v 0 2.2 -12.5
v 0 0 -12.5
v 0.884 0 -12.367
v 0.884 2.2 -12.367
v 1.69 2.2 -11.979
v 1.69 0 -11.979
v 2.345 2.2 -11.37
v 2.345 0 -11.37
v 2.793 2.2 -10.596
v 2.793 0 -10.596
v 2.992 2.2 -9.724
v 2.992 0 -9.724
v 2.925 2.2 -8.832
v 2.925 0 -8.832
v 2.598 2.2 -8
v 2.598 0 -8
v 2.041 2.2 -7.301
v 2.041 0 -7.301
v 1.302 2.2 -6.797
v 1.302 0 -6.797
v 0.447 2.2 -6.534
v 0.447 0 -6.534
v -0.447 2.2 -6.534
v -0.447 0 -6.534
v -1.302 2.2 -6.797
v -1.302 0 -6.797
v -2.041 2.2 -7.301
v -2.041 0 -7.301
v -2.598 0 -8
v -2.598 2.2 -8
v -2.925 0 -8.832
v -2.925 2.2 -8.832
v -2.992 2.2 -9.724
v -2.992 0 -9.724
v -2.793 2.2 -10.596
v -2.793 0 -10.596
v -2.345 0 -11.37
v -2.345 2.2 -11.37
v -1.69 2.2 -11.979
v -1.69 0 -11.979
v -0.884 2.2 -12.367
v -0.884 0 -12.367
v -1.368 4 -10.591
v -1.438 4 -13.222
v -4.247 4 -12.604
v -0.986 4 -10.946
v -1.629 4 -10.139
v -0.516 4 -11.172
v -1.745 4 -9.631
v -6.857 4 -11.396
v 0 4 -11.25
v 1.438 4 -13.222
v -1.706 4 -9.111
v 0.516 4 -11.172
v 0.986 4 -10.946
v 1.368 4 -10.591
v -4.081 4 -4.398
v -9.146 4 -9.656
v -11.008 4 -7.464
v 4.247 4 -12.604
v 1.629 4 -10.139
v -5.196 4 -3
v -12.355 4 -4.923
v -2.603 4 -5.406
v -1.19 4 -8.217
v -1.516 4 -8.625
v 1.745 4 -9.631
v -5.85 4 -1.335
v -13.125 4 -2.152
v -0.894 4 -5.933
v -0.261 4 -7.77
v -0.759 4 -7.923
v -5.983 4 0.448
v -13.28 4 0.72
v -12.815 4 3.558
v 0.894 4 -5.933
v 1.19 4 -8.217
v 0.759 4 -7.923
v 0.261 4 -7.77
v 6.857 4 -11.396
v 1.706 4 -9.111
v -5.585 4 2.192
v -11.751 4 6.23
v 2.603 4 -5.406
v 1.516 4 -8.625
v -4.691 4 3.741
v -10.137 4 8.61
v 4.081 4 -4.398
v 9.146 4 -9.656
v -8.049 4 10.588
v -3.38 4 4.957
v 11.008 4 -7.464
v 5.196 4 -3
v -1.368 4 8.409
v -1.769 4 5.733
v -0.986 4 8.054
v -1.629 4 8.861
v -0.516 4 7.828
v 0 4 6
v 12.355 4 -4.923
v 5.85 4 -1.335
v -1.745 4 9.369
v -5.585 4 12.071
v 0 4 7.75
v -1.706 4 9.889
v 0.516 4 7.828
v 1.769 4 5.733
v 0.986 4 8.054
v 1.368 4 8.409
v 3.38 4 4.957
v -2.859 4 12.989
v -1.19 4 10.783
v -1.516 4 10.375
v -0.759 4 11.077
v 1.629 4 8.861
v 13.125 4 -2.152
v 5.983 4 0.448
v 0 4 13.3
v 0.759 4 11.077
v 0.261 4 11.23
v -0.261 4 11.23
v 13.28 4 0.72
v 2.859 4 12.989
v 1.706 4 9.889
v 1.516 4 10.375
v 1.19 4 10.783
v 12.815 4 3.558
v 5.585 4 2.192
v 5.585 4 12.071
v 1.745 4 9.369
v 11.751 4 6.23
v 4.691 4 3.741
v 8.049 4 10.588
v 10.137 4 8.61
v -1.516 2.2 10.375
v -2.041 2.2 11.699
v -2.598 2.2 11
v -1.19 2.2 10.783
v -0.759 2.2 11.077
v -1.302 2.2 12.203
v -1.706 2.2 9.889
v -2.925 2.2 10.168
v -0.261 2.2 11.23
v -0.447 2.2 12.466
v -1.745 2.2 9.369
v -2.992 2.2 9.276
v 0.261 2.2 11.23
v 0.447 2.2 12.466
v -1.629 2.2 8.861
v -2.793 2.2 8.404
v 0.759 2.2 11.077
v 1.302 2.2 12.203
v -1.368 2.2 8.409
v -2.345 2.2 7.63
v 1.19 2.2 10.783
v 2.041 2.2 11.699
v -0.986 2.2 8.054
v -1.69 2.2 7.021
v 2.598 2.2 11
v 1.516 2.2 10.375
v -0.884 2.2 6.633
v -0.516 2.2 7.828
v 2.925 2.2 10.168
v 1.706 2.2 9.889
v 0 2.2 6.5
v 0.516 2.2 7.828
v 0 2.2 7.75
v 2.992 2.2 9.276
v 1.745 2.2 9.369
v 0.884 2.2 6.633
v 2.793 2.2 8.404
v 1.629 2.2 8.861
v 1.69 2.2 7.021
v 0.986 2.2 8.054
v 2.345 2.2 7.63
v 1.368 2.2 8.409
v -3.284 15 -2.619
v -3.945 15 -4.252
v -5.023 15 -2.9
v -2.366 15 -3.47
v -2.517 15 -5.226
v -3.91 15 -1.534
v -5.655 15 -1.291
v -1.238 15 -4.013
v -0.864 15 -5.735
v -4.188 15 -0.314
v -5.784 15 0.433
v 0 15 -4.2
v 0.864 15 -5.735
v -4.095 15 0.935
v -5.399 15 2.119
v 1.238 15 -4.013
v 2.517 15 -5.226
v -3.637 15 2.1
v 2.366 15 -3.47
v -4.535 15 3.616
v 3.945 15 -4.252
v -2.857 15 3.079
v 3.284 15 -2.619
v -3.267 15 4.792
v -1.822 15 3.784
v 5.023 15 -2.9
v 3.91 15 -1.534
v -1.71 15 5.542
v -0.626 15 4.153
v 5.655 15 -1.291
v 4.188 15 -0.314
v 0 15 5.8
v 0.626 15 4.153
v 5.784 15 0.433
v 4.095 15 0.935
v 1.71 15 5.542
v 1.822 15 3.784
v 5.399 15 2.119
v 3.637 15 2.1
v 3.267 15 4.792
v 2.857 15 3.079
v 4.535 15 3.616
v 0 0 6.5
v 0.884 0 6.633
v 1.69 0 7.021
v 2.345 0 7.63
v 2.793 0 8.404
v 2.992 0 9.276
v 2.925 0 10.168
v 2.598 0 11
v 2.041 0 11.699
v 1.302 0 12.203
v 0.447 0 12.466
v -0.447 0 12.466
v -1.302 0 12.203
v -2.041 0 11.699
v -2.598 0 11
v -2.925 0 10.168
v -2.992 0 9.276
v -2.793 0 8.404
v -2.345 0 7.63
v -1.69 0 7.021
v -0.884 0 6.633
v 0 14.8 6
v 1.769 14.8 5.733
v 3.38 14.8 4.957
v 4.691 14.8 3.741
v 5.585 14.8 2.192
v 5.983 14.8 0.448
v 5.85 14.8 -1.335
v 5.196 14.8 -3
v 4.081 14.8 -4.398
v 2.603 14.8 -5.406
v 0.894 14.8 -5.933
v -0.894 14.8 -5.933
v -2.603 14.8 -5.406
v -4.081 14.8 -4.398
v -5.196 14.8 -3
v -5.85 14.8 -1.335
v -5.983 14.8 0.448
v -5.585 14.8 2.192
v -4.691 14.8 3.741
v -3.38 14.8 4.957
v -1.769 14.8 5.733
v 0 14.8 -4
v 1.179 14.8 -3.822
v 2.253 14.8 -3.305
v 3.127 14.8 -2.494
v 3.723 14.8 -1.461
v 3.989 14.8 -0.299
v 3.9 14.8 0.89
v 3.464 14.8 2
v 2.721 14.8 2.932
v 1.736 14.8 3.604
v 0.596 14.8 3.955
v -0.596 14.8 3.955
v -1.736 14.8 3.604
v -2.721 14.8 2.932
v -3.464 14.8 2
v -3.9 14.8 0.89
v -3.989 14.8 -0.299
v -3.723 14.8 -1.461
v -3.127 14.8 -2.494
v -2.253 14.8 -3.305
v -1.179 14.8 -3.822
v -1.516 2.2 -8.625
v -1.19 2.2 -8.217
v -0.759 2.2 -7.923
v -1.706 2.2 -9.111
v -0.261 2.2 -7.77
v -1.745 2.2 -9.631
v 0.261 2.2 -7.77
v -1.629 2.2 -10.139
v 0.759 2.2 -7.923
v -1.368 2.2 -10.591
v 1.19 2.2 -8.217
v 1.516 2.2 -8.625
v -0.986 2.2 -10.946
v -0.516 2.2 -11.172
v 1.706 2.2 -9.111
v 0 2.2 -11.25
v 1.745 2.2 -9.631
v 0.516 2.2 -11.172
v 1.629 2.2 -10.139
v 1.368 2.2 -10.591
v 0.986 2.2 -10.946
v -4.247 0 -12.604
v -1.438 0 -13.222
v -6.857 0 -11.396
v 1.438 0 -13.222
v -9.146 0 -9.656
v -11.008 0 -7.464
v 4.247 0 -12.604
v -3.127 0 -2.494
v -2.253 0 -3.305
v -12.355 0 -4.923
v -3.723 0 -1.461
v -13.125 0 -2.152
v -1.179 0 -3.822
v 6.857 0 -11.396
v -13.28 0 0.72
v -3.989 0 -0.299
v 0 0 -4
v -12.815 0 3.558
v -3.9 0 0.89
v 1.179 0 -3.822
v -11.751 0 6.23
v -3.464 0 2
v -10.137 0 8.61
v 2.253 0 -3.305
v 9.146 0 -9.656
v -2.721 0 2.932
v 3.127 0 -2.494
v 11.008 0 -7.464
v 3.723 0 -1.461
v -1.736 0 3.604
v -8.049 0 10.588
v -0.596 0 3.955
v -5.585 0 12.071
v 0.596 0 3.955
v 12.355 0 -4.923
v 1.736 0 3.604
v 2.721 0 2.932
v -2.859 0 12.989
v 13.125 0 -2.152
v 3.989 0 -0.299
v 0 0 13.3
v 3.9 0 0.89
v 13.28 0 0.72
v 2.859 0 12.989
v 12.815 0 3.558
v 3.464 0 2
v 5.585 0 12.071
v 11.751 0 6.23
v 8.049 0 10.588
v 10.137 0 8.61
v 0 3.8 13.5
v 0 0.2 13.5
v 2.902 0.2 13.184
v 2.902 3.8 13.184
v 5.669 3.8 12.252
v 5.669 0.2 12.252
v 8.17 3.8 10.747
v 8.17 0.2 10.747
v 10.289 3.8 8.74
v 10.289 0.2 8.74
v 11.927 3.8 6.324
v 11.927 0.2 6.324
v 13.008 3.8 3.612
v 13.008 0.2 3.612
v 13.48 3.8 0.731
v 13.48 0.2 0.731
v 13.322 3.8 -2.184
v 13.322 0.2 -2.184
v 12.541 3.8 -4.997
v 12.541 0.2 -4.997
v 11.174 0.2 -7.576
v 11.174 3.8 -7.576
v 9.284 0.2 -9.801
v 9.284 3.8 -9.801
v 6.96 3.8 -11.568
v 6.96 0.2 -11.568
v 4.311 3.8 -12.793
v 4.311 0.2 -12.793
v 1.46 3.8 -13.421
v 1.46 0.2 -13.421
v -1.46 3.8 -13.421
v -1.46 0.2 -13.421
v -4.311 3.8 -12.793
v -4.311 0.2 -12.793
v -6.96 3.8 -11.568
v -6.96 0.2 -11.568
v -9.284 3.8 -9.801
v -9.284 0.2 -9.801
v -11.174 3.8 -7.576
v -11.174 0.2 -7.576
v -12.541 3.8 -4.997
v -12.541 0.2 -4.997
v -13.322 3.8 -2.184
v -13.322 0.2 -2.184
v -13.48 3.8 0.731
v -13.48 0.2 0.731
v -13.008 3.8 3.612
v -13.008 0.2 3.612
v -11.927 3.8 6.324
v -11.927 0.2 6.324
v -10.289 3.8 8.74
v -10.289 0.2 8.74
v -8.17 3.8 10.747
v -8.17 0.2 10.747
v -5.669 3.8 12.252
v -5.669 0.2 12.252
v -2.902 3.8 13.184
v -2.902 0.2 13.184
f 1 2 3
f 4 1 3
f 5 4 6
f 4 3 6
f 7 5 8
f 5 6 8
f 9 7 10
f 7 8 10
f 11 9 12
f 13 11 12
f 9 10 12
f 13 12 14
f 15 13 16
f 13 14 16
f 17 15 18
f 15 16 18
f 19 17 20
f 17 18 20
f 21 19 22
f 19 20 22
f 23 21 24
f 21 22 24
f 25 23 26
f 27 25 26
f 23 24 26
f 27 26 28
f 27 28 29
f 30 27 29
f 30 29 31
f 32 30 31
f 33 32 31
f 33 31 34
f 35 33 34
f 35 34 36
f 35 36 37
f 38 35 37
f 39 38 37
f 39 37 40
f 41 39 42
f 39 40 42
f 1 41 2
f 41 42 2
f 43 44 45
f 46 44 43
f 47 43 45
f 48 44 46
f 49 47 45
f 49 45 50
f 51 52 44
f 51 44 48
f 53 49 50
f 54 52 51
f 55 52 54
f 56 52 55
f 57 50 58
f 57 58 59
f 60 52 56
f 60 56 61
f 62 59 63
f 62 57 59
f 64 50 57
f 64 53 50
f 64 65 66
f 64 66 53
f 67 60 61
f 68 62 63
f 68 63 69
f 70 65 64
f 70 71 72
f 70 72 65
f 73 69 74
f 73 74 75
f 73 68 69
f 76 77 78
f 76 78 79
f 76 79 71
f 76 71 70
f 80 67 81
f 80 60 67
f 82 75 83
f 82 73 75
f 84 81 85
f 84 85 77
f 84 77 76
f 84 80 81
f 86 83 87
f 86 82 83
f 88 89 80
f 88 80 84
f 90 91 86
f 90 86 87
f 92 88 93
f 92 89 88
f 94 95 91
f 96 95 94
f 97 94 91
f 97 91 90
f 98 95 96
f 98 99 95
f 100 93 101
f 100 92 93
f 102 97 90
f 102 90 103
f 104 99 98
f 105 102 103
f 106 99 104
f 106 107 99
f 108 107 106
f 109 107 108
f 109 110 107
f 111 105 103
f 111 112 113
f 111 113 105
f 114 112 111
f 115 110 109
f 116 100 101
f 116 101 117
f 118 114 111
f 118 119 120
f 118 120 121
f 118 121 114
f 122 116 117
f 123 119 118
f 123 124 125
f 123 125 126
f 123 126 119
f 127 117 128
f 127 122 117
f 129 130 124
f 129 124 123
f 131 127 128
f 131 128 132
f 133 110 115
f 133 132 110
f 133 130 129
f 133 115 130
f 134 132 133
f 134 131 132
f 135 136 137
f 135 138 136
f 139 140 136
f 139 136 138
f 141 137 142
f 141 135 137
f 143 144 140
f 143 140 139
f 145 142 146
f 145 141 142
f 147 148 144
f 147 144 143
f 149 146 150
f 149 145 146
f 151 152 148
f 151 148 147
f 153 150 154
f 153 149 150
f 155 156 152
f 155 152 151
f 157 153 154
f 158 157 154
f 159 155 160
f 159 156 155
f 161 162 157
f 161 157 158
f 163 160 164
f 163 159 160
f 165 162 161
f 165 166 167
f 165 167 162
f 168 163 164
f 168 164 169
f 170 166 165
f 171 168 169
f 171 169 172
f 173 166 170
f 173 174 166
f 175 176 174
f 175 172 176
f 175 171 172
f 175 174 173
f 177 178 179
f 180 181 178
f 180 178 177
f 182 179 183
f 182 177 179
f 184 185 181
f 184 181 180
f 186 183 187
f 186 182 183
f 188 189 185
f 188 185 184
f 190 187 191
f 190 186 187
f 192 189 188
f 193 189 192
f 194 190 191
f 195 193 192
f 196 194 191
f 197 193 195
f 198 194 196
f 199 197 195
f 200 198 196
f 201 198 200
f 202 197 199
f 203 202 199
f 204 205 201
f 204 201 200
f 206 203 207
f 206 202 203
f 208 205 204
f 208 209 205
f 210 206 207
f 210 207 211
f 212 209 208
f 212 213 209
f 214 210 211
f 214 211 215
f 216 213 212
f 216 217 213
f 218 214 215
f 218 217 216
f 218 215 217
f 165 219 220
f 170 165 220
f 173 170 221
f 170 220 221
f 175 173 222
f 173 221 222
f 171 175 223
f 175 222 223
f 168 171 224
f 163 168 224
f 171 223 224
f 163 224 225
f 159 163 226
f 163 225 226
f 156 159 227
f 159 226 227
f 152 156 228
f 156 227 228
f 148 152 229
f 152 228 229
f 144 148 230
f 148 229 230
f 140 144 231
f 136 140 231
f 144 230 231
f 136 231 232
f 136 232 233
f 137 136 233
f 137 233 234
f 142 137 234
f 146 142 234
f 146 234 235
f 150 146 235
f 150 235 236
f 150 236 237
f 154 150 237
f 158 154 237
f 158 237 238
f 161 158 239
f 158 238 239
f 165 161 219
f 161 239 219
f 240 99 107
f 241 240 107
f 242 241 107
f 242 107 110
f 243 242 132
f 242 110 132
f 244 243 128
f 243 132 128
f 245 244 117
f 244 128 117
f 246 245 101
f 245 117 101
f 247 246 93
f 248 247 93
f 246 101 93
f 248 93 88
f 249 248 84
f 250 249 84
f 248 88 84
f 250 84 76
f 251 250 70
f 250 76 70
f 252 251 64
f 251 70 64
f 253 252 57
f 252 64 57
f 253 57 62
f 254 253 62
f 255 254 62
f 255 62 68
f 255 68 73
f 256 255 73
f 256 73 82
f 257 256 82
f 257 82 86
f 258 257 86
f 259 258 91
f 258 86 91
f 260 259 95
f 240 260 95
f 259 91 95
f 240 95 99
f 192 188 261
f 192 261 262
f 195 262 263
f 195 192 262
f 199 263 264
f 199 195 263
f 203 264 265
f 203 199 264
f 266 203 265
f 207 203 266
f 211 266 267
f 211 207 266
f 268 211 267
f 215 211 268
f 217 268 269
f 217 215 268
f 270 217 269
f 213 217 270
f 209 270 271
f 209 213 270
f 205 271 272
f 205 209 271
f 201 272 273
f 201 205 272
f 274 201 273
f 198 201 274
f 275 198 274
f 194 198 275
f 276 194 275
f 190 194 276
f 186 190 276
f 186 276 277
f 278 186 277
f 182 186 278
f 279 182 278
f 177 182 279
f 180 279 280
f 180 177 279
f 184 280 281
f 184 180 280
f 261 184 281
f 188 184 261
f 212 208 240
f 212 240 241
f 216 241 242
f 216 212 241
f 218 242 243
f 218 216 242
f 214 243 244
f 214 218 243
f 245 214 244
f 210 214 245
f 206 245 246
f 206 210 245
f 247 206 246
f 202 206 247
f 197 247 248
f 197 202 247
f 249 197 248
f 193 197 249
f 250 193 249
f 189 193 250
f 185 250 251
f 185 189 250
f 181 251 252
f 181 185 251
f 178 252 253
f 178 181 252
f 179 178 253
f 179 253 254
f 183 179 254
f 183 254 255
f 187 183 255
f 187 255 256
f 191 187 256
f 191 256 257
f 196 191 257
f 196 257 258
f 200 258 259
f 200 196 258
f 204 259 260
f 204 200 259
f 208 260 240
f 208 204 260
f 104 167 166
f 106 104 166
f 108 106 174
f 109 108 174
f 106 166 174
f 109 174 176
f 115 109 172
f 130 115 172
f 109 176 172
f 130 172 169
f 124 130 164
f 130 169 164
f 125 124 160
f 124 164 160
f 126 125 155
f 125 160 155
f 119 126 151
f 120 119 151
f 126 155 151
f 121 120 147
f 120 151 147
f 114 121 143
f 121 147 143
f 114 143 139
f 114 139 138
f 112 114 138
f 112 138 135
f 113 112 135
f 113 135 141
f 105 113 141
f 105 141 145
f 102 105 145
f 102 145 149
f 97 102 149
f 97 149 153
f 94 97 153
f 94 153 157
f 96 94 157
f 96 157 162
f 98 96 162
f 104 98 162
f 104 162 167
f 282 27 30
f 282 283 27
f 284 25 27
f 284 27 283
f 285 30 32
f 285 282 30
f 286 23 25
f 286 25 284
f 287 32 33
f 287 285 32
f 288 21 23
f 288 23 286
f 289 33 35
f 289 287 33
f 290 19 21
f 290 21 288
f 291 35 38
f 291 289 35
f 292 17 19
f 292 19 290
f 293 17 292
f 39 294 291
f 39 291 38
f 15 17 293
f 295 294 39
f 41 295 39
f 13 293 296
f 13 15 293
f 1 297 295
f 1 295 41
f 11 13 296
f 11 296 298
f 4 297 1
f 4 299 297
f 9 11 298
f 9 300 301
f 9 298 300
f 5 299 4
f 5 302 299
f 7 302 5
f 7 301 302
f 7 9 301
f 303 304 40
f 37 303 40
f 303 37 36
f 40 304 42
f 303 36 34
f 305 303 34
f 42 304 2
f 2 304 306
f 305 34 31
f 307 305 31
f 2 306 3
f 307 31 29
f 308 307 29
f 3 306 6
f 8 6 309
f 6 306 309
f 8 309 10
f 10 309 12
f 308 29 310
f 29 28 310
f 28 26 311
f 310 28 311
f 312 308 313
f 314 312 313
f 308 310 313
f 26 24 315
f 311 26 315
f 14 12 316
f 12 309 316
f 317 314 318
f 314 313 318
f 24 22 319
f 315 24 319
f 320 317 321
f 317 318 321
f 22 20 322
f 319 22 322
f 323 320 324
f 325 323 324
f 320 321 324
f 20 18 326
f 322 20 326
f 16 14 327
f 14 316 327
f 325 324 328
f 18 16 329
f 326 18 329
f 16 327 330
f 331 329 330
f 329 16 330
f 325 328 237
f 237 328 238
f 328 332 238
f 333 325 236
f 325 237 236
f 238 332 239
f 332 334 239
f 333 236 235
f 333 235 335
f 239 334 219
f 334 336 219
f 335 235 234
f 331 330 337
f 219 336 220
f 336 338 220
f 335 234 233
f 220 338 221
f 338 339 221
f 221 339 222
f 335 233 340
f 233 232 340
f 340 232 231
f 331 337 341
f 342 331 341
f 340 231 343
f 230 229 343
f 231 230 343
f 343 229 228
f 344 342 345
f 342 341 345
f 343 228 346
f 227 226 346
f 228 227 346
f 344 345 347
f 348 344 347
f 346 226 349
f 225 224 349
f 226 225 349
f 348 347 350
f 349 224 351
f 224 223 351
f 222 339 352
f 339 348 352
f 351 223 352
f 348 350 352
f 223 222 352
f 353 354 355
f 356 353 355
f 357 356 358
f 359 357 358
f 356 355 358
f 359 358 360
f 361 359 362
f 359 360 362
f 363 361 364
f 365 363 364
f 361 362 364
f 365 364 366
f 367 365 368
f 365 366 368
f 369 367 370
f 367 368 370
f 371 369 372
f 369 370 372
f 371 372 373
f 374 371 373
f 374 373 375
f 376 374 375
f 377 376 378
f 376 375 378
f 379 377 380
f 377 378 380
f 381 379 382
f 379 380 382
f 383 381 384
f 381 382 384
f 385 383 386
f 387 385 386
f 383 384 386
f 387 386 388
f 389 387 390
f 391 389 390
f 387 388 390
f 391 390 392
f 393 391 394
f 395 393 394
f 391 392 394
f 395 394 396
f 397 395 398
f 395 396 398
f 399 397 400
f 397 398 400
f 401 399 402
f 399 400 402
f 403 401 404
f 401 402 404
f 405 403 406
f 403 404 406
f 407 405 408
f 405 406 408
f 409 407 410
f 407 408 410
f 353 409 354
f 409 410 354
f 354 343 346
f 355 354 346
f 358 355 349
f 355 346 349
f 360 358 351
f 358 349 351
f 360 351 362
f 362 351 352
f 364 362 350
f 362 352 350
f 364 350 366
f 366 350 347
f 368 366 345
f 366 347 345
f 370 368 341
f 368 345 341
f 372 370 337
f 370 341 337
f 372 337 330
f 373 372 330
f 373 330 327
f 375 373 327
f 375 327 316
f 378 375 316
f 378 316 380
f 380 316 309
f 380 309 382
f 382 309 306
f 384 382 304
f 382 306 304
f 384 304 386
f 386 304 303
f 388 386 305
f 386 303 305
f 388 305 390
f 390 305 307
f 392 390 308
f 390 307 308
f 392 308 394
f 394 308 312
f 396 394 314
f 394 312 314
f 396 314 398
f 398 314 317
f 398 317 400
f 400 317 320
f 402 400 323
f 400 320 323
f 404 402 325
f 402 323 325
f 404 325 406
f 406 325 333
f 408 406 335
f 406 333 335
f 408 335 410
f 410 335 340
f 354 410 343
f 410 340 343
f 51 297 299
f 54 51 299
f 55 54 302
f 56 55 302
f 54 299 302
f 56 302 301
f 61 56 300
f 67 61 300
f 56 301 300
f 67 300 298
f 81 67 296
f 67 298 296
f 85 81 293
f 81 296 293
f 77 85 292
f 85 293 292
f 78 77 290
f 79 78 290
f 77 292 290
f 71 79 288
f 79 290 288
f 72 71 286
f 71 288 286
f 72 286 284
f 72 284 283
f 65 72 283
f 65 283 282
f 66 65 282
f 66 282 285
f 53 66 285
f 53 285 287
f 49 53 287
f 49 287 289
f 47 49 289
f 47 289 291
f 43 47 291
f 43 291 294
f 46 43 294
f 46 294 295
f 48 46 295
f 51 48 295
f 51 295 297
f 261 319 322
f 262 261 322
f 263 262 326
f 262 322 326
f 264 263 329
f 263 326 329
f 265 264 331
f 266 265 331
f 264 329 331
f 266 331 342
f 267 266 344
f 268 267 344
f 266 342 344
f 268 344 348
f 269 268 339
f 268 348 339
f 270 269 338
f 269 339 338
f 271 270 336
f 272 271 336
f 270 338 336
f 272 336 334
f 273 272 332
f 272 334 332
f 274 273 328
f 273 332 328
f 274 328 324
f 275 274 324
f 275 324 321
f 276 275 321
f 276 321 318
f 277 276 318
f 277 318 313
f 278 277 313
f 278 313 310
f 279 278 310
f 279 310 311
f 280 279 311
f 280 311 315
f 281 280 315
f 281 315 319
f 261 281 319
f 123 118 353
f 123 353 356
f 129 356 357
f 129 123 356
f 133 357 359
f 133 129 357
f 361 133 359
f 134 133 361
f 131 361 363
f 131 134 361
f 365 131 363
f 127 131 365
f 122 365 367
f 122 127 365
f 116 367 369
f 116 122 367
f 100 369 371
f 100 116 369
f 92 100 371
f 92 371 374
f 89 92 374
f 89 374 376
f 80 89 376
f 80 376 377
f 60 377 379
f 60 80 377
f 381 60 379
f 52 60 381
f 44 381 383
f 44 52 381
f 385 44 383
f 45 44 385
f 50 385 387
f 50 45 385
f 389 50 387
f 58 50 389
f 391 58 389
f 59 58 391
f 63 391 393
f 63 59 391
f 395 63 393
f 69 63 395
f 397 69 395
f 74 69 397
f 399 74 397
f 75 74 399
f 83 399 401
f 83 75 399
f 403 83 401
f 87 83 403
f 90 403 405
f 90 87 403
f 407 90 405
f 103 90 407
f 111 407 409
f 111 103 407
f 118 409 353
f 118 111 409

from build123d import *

# Parameters (mm, degrees)
SKETCH_1_R          = 13.5
EXTRUDE_1_DEPTH     = 4
SKETCH_2_R          = 6
EXTRUDE_2_DEPTH     = 11
SKETCH_3_R          = 4
CUT_EXTRUDE_1_DEPTH = 25.279621084
SKETCH_4_R          = 1.75
CUT_EXTRUDE_2_DEPTH = 25.279621084
SKETCH_5_R          = 3
CUT_EXTRUDE_3_DEPTH = 2.2
CHAMFER_1_SIZE      = 0.2


with BuildPart() as part:
    # 草图1 → 凸台-拉伸1 (new body)
    with BuildSketch(Plane(origin=(0, 0, 0), x_dir=(1, 0, 0), z_dir=(0, 1, 0))):
        with Locations(Location((0, 0, 0), (0, 0, 270))):
            Circle(SKETCH_1_R)
    extrude(amount=EXTRUDE_1_DEPTH)

    # 草图2 → 凸台-拉伸2 (add)
    with BuildSketch(Plane(origin=(0, 4, 0), x_dir=(1, 0, 0), z_dir=(0, 1, 0))):
        with Locations(Location((0, 0, 0), (0, 0, 270))):
            Circle(SKETCH_2_R)
    extrude(amount=EXTRUDE_2_DEPTH)

    # 草图3 → 切除-拉伸1 (cut, through all)
    with BuildSketch(Plane(origin=(0, 0, 0), x_dir=(-1, 0, 0), z_dir=(0, -1, 0))):
        with Locations(Location((0, 0, 0), (0, 0, 90))):
            Circle(SKETCH_3_R)
    extrude(amount=-CUT_EXTRUDE_1_DEPTH, mode=Mode.SUBTRACT)

    # 草图4 → 切除-拉伸2 (cut, through all)
    with BuildSketch(Plane.XZ):
        with Locations(Location((0, 9.5, 0), (0, 0, 270))):
            Circle(SKETCH_4_R)
        with Locations(Location((0, -9.5, 0), (0, 0, 270))):
            Circle(SKETCH_4_R)
    extrude(amount=-CUT_EXTRUDE_2_DEPTH, mode=Mode.SUBTRACT)

    # 草图5 → 切除-拉伸3 (cut)
    with BuildSketch(Plane(origin=(0, 0, 0), x_dir=(-1, 0, 0), z_dir=(0, -1, 0))):
        with Locations(Location((0, -9.5, 0), (0, 0, 90))):
            Circle(SKETCH_5_R)
        with Locations(Location((0, 9.5, 0), (0, 0, 90))):
            Circle(SKETCH_5_R)
    extrude(amount=-CUT_EXTRUDE_3_DEPTH, mode=Mode.SUBTRACT)

    # 倒角1
    chamfer_1_edges = [part.edges().sort_by_distance(p)[0] for p in [
        (0, 15, 4),
        (0, 0, -13.5),
        (0, 4, -13.5),
        (0, 15, -6),
    ]]
    chamfer(chamfer_1_edges, length=CHAMFER_1_SIZE)


solid = part.part
